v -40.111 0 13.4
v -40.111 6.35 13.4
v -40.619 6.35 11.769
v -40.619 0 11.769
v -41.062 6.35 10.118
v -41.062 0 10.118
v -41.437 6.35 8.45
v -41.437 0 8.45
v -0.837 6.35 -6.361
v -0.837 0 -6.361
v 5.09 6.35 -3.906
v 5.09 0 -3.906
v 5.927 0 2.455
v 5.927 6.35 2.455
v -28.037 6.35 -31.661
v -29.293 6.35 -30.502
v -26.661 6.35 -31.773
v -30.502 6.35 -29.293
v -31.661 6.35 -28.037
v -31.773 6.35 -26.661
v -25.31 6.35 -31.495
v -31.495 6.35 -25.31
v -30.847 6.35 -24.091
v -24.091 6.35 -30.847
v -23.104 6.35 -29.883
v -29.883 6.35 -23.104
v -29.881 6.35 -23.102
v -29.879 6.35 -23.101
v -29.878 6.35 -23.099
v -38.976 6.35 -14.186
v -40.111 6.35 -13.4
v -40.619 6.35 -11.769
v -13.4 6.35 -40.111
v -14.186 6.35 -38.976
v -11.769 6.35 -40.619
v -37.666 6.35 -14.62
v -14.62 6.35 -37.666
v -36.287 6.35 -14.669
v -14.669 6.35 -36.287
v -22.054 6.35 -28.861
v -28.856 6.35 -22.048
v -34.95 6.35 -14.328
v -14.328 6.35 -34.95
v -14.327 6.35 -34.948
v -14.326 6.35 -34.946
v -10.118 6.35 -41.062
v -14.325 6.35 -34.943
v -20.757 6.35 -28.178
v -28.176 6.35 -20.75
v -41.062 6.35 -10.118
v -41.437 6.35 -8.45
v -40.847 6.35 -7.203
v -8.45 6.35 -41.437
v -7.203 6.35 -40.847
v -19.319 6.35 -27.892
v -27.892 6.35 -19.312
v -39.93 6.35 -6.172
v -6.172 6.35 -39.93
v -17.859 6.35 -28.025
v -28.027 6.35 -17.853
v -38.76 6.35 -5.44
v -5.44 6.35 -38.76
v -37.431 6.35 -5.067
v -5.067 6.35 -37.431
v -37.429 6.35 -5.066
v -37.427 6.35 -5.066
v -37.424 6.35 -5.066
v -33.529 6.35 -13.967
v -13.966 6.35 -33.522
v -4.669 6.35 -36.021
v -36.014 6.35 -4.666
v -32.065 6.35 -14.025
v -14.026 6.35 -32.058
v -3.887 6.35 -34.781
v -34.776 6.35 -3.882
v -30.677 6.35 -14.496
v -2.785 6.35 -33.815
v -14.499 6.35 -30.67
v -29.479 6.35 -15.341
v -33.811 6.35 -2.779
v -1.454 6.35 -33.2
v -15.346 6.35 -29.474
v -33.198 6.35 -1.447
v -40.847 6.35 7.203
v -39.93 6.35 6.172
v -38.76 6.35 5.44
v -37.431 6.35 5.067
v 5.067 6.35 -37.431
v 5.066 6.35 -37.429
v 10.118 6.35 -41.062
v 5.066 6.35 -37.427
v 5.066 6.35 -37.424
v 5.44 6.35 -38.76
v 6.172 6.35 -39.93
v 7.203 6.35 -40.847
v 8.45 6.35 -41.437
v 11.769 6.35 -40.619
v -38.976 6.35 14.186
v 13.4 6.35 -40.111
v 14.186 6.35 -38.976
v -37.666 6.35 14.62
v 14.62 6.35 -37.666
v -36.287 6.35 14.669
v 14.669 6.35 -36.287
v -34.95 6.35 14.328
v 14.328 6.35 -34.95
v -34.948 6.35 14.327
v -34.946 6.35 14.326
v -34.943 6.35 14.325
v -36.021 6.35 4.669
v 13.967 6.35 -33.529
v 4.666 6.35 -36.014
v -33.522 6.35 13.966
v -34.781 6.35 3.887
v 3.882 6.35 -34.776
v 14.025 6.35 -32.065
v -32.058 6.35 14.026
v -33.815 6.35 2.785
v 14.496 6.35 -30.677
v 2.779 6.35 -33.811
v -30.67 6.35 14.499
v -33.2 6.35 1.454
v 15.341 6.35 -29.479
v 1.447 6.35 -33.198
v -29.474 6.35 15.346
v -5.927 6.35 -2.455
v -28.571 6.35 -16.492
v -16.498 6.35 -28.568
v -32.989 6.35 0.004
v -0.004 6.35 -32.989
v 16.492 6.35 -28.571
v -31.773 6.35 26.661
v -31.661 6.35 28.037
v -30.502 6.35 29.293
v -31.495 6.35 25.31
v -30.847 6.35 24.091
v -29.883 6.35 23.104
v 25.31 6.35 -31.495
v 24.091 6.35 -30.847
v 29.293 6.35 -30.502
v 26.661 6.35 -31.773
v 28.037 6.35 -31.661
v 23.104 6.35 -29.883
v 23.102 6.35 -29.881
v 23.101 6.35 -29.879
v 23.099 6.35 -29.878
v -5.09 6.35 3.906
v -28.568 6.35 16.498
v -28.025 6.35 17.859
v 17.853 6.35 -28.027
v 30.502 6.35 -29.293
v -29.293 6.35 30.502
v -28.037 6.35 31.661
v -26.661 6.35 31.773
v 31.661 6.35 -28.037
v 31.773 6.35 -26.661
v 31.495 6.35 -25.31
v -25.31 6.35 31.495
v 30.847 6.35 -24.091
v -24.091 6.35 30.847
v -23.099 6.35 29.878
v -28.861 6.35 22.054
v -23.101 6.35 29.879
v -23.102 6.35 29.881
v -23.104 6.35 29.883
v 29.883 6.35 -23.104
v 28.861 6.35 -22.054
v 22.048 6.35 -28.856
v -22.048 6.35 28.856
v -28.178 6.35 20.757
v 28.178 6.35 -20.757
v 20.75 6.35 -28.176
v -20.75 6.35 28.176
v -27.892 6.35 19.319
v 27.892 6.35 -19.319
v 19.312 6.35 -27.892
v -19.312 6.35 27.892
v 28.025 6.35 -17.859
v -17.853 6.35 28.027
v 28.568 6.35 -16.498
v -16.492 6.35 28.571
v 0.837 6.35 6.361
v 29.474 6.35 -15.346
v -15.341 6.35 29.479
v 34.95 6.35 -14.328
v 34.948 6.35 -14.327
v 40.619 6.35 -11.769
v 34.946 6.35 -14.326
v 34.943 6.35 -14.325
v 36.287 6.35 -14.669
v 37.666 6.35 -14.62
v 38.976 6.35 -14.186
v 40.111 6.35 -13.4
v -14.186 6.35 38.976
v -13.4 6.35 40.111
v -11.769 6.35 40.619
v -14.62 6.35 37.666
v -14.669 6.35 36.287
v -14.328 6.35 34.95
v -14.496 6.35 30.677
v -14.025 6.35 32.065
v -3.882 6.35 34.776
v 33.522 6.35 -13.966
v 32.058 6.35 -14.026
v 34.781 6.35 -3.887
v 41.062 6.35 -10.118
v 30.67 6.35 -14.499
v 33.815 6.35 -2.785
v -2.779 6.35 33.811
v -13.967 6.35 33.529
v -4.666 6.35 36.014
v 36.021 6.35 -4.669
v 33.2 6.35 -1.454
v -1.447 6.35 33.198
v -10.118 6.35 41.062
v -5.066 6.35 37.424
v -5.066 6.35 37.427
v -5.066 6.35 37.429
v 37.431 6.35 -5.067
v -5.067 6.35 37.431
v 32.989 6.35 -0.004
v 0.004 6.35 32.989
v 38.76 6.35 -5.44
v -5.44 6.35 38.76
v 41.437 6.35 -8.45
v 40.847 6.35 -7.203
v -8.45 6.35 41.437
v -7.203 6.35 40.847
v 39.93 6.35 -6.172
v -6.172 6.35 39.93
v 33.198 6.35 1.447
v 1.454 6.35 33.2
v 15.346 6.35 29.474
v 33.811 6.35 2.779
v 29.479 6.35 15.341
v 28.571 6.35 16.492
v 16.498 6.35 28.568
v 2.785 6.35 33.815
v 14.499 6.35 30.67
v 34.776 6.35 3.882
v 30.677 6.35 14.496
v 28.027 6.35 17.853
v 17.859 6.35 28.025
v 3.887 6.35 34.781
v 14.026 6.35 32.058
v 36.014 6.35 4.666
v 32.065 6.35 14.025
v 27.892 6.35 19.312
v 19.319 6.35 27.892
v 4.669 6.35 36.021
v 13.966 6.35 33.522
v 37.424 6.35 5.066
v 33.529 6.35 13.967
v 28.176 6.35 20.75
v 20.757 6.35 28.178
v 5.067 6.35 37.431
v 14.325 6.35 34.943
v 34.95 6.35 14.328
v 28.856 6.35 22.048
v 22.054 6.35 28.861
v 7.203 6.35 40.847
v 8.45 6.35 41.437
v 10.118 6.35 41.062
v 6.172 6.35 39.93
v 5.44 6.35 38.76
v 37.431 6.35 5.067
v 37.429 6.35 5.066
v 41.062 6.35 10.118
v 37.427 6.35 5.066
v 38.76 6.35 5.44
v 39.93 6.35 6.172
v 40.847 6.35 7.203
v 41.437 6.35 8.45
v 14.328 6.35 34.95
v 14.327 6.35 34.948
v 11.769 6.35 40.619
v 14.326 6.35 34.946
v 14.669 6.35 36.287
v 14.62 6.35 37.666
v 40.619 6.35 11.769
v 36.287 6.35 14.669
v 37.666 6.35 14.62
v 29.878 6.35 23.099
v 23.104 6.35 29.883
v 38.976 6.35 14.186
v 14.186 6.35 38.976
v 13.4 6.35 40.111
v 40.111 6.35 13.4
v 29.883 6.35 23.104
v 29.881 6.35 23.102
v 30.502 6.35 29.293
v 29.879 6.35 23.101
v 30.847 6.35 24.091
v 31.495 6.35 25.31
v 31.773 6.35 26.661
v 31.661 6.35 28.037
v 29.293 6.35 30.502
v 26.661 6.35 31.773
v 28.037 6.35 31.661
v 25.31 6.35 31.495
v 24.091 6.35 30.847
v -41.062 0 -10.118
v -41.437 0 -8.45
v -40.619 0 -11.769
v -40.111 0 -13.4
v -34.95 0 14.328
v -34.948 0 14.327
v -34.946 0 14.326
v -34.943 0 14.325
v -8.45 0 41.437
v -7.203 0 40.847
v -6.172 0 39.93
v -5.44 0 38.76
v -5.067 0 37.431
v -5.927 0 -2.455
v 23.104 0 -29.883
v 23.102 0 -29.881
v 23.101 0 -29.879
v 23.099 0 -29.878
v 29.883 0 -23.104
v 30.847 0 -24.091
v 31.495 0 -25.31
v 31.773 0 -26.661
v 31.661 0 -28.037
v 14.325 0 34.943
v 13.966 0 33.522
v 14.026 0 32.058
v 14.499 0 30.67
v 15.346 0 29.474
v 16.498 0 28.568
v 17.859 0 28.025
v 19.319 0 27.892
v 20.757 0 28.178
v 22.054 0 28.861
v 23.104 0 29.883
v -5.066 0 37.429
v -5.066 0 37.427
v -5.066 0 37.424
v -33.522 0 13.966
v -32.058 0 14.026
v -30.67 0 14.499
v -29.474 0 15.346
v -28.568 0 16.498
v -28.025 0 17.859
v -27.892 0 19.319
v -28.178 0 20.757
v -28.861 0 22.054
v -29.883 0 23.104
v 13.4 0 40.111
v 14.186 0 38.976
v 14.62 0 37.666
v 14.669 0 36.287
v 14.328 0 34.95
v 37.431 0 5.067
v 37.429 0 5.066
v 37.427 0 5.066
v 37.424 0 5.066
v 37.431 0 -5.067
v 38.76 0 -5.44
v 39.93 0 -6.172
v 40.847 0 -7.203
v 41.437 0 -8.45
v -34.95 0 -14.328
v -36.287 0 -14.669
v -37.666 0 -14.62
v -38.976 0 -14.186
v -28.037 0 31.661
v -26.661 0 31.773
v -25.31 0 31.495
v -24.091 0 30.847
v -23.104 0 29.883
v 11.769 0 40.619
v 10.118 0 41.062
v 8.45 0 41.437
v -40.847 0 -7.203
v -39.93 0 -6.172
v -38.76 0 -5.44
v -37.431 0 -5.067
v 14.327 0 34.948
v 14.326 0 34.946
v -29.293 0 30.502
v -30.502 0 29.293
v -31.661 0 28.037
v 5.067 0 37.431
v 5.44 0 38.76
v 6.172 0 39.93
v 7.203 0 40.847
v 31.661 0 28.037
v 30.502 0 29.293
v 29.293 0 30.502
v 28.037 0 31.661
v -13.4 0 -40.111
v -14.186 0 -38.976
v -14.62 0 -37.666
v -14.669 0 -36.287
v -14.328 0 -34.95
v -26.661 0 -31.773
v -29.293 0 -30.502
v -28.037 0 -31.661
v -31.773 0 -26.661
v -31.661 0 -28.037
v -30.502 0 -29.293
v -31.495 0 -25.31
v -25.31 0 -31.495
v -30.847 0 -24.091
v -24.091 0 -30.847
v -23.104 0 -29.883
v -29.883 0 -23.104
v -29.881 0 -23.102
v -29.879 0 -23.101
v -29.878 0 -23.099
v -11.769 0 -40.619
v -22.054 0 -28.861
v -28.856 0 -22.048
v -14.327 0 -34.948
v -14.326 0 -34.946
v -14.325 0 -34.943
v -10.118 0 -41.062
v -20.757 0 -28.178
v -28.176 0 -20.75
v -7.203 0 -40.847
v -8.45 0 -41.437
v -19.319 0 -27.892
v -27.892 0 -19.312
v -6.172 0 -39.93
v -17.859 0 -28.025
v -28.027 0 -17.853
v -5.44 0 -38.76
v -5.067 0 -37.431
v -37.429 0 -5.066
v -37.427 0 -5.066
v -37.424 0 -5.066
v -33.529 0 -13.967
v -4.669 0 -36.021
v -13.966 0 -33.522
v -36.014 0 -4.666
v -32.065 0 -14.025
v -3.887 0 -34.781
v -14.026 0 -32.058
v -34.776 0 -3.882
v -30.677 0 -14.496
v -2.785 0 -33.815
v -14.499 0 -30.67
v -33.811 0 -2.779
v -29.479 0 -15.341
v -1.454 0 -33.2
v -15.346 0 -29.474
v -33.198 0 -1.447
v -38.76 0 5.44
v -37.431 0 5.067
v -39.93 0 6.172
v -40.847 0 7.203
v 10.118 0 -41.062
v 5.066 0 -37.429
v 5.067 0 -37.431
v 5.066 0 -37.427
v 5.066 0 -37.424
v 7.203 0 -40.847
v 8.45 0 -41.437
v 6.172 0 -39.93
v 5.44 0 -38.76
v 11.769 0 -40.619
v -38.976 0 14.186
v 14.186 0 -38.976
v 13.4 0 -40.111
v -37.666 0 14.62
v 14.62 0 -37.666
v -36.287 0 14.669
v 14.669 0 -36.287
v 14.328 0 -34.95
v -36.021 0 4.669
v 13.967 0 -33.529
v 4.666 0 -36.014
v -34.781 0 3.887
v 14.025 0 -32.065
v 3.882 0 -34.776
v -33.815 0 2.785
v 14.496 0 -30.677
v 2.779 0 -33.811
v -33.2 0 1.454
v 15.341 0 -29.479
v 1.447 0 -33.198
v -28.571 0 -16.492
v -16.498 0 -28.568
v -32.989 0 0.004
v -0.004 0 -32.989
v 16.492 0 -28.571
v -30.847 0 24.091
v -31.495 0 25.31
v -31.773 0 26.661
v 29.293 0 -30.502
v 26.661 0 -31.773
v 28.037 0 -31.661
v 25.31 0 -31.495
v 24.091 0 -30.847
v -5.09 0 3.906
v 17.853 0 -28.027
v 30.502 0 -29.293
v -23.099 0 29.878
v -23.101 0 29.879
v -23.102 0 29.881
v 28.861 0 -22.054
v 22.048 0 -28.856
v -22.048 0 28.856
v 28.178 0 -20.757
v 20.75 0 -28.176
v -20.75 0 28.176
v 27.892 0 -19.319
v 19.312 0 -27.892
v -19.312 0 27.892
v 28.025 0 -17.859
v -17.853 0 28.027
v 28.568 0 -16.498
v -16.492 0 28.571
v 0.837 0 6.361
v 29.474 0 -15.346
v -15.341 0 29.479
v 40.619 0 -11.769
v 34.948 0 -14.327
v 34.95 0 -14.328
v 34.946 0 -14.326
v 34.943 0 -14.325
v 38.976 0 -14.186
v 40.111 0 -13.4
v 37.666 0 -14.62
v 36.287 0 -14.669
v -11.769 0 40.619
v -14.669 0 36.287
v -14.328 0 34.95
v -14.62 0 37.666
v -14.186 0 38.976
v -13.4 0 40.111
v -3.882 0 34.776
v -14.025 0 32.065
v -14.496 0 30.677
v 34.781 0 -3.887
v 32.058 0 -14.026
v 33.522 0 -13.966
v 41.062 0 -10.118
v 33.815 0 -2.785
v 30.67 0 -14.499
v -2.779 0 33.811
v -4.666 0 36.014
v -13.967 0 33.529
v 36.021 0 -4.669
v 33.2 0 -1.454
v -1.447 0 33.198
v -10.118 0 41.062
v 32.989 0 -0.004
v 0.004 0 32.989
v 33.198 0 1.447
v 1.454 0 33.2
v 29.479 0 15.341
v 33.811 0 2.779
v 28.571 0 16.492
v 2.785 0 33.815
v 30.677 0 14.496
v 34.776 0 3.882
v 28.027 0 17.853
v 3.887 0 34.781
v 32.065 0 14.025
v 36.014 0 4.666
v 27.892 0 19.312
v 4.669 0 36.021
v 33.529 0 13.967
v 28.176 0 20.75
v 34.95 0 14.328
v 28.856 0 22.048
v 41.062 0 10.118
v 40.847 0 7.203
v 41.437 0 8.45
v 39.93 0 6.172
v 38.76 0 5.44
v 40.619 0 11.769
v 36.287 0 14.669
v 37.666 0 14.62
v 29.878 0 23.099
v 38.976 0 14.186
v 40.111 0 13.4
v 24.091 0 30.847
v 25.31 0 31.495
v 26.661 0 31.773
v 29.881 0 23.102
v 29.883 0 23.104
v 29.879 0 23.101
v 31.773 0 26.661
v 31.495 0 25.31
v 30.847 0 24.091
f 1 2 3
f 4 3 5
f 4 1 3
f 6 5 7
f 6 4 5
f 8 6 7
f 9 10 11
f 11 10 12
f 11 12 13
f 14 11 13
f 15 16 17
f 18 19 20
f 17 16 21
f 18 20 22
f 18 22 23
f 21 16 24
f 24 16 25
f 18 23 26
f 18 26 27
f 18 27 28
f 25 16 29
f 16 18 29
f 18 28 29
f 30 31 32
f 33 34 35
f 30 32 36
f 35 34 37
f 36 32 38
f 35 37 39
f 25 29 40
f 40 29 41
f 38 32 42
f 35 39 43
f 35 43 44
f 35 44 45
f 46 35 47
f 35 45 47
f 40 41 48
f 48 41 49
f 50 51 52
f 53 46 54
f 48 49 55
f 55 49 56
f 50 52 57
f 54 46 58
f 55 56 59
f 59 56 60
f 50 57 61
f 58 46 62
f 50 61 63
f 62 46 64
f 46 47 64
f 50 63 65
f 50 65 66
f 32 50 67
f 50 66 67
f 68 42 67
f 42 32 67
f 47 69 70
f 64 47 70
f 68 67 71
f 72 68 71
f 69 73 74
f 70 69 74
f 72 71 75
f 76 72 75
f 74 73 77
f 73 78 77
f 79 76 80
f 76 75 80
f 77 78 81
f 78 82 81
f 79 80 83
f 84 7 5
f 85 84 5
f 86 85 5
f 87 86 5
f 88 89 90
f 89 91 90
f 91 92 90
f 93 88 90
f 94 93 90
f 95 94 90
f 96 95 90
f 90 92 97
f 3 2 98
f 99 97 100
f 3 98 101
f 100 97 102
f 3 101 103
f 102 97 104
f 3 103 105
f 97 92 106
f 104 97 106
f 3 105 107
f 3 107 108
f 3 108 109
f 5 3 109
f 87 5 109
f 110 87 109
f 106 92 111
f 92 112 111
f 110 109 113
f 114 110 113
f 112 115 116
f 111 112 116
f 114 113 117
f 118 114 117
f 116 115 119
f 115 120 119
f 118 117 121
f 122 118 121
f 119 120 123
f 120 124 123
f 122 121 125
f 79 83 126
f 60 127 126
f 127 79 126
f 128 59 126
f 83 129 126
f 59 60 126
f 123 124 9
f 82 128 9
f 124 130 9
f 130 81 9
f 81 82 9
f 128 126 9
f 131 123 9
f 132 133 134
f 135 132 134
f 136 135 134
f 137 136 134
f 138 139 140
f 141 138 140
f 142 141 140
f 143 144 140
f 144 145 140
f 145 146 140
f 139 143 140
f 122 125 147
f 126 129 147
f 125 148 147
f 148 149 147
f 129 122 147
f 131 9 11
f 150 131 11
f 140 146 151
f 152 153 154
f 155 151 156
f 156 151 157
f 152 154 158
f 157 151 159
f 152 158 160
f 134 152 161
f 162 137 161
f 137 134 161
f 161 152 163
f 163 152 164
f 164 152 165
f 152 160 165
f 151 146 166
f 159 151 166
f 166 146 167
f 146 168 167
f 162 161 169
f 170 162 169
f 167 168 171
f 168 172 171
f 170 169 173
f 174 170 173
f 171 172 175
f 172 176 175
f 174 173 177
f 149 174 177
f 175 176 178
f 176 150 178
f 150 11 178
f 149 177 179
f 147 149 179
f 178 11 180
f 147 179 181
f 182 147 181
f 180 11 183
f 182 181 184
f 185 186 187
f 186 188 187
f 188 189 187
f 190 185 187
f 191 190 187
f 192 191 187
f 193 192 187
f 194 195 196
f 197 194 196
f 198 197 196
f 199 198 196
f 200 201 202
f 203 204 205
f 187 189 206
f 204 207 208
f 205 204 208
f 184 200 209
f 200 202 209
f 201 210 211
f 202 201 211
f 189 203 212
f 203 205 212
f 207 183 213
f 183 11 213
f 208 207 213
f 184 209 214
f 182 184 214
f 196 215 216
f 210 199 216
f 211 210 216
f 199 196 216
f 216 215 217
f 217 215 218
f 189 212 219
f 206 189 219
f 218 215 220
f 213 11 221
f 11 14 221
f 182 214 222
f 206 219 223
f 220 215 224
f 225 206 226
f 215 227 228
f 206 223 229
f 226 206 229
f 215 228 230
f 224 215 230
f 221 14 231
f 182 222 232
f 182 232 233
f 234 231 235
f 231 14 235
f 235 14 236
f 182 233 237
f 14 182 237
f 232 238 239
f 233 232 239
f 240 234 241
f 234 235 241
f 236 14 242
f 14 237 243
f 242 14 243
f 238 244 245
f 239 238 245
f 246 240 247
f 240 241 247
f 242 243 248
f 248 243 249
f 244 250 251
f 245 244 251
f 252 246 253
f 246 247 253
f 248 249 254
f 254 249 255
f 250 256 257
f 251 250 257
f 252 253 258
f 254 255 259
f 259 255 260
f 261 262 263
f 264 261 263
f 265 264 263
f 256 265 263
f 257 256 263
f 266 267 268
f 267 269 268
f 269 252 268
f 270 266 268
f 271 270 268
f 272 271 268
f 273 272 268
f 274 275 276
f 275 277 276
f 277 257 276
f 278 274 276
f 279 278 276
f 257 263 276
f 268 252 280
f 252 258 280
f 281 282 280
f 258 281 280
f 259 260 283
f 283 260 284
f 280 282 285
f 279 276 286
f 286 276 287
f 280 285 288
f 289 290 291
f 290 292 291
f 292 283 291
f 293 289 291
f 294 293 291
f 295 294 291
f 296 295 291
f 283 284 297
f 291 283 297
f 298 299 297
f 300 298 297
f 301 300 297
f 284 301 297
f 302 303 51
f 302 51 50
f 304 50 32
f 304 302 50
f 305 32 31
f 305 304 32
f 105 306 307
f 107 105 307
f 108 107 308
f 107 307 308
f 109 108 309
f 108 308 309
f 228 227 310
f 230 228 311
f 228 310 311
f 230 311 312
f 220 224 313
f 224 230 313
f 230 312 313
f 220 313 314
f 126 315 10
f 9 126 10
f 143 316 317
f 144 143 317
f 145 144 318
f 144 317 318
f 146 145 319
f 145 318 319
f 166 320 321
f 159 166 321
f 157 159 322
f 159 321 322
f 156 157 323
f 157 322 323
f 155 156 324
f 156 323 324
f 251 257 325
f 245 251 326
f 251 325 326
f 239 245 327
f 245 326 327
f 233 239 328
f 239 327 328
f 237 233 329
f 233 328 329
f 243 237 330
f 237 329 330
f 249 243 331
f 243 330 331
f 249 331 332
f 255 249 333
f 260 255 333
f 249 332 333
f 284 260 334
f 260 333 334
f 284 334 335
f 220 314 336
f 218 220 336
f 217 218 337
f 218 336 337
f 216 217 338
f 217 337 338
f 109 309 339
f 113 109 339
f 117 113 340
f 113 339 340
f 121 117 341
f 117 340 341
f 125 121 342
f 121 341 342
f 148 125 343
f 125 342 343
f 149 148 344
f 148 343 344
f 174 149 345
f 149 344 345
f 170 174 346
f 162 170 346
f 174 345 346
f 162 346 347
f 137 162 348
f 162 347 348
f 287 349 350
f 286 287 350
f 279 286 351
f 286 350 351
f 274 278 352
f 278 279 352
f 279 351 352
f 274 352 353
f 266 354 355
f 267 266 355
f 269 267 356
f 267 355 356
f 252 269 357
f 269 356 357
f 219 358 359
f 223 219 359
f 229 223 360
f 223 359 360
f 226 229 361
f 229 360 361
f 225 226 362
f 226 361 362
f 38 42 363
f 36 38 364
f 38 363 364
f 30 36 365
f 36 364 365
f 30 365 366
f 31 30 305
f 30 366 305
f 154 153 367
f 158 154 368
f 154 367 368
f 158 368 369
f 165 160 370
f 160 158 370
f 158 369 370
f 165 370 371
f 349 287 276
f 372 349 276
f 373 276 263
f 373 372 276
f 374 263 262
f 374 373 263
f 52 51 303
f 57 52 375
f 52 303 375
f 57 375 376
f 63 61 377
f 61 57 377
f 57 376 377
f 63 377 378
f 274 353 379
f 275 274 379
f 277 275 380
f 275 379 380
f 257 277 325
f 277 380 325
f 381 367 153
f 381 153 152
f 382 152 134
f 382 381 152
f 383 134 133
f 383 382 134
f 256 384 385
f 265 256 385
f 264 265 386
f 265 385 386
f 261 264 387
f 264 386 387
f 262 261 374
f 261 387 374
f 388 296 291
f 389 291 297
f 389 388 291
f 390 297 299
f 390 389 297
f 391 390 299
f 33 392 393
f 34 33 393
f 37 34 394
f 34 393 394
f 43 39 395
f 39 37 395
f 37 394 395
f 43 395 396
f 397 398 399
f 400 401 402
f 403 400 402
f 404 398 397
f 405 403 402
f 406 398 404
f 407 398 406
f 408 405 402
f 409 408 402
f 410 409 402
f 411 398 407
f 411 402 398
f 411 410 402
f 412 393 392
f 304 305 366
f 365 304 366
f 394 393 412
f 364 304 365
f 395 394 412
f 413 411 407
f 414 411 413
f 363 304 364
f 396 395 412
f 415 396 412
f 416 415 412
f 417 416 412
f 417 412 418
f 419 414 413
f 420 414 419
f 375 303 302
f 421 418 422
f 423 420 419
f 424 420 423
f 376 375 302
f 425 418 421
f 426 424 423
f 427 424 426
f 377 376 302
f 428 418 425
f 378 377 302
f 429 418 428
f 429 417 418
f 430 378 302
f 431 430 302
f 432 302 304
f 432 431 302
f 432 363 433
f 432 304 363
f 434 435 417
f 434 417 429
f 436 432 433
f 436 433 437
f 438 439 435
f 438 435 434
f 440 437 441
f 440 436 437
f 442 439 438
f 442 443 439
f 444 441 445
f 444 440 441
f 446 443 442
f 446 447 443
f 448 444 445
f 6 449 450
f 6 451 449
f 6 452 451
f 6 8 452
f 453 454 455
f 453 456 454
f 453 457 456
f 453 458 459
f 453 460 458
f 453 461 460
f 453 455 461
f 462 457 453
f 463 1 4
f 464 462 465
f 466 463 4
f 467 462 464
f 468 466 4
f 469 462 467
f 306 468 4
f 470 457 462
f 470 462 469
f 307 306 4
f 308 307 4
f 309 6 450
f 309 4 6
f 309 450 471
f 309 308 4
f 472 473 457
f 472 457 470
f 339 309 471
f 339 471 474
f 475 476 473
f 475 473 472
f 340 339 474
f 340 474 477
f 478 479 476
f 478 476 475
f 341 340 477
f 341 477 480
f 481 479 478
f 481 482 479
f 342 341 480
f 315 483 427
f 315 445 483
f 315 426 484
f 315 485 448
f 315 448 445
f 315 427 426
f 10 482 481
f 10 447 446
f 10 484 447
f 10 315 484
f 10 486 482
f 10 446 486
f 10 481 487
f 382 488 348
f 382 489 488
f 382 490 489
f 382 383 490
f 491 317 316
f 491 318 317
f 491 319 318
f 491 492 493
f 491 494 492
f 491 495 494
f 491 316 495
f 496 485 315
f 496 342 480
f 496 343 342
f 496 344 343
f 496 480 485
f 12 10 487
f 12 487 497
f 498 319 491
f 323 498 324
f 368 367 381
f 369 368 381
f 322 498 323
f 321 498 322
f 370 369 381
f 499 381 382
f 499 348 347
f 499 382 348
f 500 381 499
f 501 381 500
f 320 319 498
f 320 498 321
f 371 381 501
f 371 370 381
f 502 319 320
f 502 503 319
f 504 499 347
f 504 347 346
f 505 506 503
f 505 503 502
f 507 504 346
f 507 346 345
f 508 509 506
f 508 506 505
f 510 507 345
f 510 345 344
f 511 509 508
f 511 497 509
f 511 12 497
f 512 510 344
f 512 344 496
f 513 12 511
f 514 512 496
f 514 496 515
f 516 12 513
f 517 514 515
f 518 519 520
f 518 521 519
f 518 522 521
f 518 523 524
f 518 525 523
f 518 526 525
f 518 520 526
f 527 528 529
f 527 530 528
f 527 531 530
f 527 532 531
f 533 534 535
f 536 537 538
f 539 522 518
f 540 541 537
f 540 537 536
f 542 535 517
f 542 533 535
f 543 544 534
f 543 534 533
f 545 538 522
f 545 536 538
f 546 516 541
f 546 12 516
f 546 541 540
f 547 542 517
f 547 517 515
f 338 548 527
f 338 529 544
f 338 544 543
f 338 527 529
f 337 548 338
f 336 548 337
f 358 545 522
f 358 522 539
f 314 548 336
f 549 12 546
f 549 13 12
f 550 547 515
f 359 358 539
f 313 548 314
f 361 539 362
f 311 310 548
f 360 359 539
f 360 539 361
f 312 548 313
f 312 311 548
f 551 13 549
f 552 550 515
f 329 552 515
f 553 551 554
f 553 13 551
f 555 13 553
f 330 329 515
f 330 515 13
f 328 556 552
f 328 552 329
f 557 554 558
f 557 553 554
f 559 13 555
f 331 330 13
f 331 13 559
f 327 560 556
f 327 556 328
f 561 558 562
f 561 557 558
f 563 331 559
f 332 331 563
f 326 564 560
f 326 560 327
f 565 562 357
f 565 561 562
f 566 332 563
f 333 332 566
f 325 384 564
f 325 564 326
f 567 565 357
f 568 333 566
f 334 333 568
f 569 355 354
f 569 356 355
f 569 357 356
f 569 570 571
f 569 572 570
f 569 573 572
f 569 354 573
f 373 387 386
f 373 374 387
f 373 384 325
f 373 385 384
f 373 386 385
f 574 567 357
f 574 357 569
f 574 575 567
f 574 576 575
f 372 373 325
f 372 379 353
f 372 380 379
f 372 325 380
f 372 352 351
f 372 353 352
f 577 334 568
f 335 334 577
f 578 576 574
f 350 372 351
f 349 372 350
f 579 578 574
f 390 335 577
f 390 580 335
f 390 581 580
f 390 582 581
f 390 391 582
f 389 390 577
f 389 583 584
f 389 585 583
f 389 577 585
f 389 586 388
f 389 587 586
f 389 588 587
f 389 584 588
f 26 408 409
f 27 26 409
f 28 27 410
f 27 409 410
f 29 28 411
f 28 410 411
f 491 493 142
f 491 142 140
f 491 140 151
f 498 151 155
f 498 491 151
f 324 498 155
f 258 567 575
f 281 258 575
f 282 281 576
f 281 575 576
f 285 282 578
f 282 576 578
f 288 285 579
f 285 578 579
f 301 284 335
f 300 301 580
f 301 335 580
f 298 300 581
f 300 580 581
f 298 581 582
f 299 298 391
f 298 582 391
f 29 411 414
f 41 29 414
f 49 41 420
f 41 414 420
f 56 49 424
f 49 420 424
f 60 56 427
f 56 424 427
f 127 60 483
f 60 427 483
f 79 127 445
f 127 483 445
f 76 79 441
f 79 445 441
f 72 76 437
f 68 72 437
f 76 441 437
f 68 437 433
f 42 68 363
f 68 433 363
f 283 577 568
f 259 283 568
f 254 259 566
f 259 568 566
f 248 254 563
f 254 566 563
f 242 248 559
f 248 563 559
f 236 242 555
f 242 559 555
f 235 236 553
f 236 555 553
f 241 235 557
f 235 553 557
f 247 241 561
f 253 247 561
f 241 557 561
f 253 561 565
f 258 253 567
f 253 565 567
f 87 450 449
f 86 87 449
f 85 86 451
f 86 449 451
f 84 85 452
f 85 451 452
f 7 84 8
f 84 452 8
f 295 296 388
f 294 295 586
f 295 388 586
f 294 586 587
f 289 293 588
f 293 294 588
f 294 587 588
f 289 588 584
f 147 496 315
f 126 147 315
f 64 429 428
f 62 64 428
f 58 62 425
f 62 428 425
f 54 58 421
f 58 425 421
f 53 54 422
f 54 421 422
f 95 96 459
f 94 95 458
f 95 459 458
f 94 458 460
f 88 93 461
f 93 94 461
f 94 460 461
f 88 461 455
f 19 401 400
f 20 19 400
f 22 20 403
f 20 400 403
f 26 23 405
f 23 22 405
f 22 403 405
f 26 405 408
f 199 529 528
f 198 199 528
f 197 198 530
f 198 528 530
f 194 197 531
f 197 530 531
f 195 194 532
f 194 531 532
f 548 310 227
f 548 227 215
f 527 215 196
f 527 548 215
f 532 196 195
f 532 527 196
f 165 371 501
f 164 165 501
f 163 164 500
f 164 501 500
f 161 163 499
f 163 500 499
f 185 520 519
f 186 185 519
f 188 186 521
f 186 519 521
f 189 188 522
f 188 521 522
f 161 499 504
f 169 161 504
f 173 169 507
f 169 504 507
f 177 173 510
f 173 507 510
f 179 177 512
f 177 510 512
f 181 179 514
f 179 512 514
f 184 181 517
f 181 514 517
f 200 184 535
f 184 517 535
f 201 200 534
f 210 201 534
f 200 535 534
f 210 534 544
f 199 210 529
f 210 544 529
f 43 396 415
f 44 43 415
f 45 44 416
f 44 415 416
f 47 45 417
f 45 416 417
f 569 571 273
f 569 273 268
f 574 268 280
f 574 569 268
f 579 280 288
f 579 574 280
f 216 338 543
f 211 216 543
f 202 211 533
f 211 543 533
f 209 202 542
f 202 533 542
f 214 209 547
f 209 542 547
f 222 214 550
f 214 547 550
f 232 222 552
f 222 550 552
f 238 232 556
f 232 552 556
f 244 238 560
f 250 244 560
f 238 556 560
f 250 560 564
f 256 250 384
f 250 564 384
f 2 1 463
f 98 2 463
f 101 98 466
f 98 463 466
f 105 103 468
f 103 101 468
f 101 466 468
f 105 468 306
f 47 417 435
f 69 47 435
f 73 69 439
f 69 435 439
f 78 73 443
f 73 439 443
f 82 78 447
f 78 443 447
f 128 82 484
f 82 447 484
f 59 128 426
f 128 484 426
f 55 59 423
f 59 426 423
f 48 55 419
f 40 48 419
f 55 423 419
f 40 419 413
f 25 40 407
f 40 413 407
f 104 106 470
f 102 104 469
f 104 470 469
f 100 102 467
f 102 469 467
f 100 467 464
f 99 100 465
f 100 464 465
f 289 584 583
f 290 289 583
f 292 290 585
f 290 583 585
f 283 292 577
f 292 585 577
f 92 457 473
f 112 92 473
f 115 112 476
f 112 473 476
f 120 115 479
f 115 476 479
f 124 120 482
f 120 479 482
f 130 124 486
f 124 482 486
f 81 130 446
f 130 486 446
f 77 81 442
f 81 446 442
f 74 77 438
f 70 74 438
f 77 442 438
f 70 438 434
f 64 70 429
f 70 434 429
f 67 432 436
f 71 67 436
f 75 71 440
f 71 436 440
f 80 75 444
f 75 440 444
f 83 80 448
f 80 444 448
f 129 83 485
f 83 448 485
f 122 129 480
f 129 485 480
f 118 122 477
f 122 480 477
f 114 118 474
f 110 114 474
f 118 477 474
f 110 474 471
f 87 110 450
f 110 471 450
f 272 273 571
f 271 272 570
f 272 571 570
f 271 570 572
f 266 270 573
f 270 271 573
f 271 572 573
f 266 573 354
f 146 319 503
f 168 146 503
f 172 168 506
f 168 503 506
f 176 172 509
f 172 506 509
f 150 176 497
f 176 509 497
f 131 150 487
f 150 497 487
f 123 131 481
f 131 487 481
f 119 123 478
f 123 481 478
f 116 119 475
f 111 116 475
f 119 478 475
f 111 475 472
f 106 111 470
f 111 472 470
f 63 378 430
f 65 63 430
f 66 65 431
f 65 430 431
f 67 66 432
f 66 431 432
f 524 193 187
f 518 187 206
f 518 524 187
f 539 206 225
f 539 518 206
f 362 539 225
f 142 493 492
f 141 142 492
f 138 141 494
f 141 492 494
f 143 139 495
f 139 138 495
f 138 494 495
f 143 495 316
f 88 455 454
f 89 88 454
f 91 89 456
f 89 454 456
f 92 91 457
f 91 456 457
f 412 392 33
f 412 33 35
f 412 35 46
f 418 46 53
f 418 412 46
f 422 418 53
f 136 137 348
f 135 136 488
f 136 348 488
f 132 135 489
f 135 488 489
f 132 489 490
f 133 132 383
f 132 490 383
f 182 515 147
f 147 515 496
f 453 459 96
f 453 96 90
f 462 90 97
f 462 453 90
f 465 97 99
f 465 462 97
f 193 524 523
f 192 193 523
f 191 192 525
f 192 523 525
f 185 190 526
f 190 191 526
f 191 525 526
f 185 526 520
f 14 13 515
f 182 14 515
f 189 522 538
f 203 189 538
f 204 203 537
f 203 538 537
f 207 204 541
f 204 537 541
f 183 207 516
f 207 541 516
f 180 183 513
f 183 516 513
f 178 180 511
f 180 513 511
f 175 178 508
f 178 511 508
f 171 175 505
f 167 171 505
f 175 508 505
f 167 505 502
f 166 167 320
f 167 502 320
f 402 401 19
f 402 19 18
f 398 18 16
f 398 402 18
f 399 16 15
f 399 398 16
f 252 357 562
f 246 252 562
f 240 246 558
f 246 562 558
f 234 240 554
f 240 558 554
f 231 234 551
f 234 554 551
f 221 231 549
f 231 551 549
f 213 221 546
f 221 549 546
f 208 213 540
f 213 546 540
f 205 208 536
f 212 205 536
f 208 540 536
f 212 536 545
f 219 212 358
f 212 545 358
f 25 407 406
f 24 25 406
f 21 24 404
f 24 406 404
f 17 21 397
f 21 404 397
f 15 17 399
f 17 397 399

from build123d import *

# Parameters (mm, degrees)
F0_R            = 42.2899684473
F1_DEPTH        = 6.35
F3_DEPTH        = 6.351
F3_COPIES_COUNT = 12
F5_DEPTH        = 6.351


# Not quite as in the source:
# - a pattern or mirror of a feature is missing from the dataset's text; its kind, count and spacing are read off the source's solid


with BuildPart() as f1:
    # F0 (on Front) → F1 (new body)
    with BuildSketch(Plane.XZ):
        Circle(F0_R)
    extrude(amount=-F1_DEPTH)

    # F2 (on face) → F3 (cut, through all)
    with BuildSketch(Plane.XZ):
        with BuildLine():
            ThreePointArc((-41.4371280171, -8.4501983983), (-39.9301176937, -6.1715058408), (-37.4314860419, -5.0668068974))
            ThreePointArc((-37.4314860419, -5.0668068974), (-37.42798385, -5.0663435871), (-37.4244819792, -5.065877856))
            ThreePointArc((-37.4244819792, -5.065877856), (-32.9892827736, 0.0035327048), (-37.4314860419, 5.0668068974))
            ThreePointArc((-37.4314860419, 5.0668068974), (-39.9301176937, 6.1715058408), (-41.4371280171, 8.4501983983))
            ThreePointArc((-41.4371280171, 8.4501983983), (-42.2899684473, 0), (-41.4371280171, -8.4501983983))
        make_face()
    f3 = extrude(amount=-F3_DEPTH, mode=Mode.SUBTRACT)

    # F3_copies: F3 ×12 about axis
    f3_copies_axis = Axis((0, 0, 0), (0, 1, 0))
    for i in range(1, F3_COPIES_COUNT):
        add(f3.rotate(f3_copies_axis, i * 360 / F3_COPIES_COUNT), mode=Mode.SUBTRACT)

    # F4 (on face) → F5 (cut, through all)
    with BuildSketch(Plane.XZ):
        Polygon((0.8374305792, 6.3609167663), (-5.0900002214, 3.9056945387), (-5.9274308006, -2.4552222276), (-0.8374305792, -6.3609167663), (5.0900002214, -3.9056945387), (5.9274308006, 2.4552222276), align=None)
    extrude(amount=-F5_DEPTH, mode=Mode.SUBTRACT)


solid = f1.part
